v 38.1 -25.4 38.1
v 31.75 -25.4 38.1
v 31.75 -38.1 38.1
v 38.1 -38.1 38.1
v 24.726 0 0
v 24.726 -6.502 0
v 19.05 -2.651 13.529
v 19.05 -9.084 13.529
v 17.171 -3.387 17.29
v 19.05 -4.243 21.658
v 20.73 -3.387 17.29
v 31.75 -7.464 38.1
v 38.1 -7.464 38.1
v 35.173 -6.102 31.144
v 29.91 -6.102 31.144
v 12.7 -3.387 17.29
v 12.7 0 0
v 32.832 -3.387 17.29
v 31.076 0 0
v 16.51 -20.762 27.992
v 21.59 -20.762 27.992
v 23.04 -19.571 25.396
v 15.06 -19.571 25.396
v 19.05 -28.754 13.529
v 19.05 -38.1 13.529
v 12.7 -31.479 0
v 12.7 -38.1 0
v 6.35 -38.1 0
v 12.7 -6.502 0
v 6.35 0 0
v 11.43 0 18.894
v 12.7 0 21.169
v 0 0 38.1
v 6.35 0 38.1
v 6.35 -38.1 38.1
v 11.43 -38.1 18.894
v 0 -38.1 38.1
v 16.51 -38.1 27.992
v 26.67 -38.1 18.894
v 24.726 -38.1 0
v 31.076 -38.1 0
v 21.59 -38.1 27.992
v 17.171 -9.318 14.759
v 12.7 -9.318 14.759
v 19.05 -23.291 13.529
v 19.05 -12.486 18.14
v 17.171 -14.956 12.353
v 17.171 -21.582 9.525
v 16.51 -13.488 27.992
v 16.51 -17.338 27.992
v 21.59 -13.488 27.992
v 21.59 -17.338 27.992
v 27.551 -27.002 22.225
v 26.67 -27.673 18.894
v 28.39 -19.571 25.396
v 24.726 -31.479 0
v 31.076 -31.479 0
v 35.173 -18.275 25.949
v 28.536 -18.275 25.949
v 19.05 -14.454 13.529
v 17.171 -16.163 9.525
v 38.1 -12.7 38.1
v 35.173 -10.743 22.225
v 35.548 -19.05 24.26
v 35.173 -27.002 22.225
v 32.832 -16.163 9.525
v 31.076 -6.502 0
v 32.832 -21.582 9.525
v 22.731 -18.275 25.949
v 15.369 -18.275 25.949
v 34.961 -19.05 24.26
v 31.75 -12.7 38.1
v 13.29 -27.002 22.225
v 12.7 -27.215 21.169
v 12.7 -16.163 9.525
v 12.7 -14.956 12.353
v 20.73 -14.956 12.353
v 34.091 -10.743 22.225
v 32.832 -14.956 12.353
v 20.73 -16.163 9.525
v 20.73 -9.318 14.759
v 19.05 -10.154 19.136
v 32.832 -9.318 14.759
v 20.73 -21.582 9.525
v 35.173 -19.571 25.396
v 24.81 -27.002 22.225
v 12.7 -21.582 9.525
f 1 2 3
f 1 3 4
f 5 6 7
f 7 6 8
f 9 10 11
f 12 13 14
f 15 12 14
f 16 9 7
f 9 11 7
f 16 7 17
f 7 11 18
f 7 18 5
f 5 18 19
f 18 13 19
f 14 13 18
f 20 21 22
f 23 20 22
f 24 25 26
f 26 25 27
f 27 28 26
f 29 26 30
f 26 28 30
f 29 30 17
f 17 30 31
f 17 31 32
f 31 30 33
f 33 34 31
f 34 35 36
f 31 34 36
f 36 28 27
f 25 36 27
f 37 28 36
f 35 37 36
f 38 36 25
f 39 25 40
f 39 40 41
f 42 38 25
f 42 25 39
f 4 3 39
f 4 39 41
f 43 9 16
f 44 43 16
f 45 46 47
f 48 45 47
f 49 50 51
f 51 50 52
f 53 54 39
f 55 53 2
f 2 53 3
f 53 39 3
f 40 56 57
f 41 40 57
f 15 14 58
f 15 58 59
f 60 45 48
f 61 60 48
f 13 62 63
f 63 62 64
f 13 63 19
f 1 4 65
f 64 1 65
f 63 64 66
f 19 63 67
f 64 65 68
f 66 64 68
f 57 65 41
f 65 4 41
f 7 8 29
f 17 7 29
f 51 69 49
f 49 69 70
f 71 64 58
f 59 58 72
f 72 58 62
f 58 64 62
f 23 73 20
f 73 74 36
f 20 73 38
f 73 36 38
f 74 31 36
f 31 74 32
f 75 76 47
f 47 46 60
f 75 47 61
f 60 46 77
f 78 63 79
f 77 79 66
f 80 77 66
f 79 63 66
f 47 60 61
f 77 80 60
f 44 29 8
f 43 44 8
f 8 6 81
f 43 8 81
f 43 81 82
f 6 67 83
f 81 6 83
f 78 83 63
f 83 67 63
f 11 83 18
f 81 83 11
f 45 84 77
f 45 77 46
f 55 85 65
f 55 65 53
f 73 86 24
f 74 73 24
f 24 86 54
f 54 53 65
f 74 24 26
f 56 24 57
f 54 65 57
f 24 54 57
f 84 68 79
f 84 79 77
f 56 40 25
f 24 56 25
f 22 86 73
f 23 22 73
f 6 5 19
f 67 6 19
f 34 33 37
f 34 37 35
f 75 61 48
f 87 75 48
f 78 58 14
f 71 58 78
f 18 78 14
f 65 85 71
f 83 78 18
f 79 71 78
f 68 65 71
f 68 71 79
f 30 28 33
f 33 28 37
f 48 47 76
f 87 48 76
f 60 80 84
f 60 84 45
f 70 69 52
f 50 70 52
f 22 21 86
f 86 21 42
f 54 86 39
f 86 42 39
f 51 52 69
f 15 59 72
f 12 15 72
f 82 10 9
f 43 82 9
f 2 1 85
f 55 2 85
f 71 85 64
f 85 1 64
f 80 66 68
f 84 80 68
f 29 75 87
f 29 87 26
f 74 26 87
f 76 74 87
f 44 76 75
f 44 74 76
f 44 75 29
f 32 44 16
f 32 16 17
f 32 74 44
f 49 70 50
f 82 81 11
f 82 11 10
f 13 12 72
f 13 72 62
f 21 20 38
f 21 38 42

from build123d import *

# Parameters (mm, degrees)
F0_W      = 38.1
F0_H      = 38.1
F1_DEPTH  = 38.1
F4_DEPTH  = 38.1
F7_DEPTH  = 25.4
F8_DEPTH  = 25.4
F11_DEPTH = 25.4
F12_W     = 24.5706126973
F12_H     = 7.62
F13_DEPTH = 25.4
F14_DEPTH = 25.4


with BuildPart() as f1:
    # F0 (on Front) → F1 (new body)
    with BuildSketch(Plane.XZ):
        with Locations((19.05, 19.05)):
            Rectangle(F0_W, F0_H)
    extrude(amount=F1_DEPTH)

    # F0 (on Front) → F4 (join)
    with BuildSketch(Plane.XZ):
        with Locations((19.05, 19.05)):
            Rectangle(F0_W, F0_H)
    extrude(amount=F4_DEPTH)

    # F6 (on face) → F7 (cut)
    with BuildSketch(Plane.XZ.offset(38.1)):
        Polygon((31.75, 38.1), (6.35, 38.1), (11.43, 18.8944898546), (16.51, 27.9918368906), (21.59, 27.9918368906), (26.67, 18.8944898546), align=None)
        Polygon((6.35, 0), (0, 38.1), (0, 0), align=None)
        Polygon((19.05, 13.529388234), (12.7, 0), (24.7261244804, 0), align=None)
        Polygon((38.1, 0), (38.1, 38.1), (31.0761244804, 0), align=None)
    extrude(amount=-F7_DEPTH, mode=Mode.SUBTRACT)

    # F8 (cut): faces of the model
    f8_faces = [f1.faces().sort_by_distance(p)[0] for p in [
        (2.1166666667, -12.7, 12.7),
        (19.05, -12.7, 31.3496059527),
        (18.8253748268, -12.7, 4.509796078),
        (35.7587081601, -12.7, 12.7),
    ]]
    extrude(f8_faces, amount=-F8_DEPTH, mode=Mode.SUBTRACT)

    # F10 (on offset) + F9 (on offset) → F11 (cut)
    with BuildSketch(Plane.YZ.offset(38.1)):
        Polygon((-27.0018987358, 22.225), (-31.4789675176, 0), (-6.5016360022, 0), (-10.7430694625, 22.225), (-16.1626785994, 9.525), (-21.5822886676, 9.525), align=None)
    with BuildSketch(Plane.YZ.offset(38.1)):
        Polygon((-19.05, 24.2595933378), (-12.7, 38.1), (-25.4, 38.1), align=None)
        Polygon((-7.464489516, 38.1), (0, 0), (0, 38.1), align=None)
    extrude(amount=-F11_DEPTH, mode=Mode.SUBTRACT)

    # F12 (on Top) → F13 (cut)
    with BuildSketch(Plane.XY):
        with Locations((25.8146936513, -26.67)):
            Rectangle(F12_W, F12_H)
    extrude(amount=-F13_DEPTH, mode=Mode.SUBTRACT)

    # F14 (cut): a face of the model
    f14_faces = [f1.faces().sort_by_distance(p)[0] for p in [
        (23.4427598086, -24.3604736917, 16.0352377039),
    ]]
    extrude(f14_faces, amount=-F14_DEPTH, mode=Mode.SUBTRACT)


solid = f1.part
